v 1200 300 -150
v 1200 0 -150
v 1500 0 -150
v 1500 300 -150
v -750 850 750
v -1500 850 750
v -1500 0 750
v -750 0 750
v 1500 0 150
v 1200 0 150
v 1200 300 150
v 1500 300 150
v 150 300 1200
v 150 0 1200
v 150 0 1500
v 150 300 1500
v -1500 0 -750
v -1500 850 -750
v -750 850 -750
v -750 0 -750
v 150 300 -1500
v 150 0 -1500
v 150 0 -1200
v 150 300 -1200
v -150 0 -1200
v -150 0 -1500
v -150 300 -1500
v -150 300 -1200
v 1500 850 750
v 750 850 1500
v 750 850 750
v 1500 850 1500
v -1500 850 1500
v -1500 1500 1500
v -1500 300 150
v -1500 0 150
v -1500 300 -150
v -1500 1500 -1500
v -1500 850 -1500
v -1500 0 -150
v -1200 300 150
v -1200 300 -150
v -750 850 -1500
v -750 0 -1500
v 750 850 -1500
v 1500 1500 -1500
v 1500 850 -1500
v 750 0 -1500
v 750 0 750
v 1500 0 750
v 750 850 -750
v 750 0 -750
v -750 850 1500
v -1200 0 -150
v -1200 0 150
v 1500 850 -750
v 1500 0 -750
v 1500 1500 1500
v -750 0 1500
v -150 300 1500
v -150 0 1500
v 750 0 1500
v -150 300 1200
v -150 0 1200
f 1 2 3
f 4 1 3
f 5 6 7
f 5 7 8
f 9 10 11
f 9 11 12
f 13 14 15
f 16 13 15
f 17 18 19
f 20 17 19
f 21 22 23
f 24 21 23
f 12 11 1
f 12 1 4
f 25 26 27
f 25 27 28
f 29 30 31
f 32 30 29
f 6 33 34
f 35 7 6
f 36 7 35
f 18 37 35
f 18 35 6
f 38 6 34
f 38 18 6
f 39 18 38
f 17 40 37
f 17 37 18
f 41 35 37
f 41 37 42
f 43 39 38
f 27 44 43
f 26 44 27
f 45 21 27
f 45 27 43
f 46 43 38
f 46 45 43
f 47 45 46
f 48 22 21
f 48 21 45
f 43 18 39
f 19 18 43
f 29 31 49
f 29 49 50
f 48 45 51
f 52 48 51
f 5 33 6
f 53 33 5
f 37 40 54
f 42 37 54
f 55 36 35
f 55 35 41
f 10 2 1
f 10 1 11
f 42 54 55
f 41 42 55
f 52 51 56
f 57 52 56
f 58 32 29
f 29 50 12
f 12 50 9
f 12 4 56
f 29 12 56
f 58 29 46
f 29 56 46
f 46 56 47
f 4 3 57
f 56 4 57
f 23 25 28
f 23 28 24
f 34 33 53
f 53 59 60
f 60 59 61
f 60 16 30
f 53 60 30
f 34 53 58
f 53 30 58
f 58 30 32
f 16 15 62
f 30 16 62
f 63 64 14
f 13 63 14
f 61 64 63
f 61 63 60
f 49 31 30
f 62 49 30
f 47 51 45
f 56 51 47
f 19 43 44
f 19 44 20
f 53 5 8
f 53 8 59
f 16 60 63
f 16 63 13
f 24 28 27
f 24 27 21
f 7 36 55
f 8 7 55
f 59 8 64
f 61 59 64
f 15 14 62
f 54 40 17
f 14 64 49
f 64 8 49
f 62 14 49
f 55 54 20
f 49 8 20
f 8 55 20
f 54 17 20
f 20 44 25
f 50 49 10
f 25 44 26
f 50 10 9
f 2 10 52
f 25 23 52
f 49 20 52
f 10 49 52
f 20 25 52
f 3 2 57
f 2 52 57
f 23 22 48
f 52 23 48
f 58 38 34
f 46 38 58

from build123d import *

# Parameters (mm, degrees)
SKETCH1_W           = 3000
SKETCH1_H           = 3000
BOSS_EXTRUDE1_DEPTH = 1500
SKETCH2_W           = 750
SKETCH2_H           = 750
CUT_EXTRUDE1_DEPTH  = 850
SKETCH4_W           = 300
SKETCH4_H           = 300
CUT_EXTRUDE2_DEPTH  = 300


with BuildPart() as part:
    # Sketch1 → Boss-Extrude1 (new body)
    with BuildSketch(Plane(origin=(0, 0, 0), x_dir=(1, 0, 0), z_dir=(0, 1, 0))):
        Rectangle(SKETCH1_W, SKETCH1_H)
    extrude(amount=BOSS_EXTRUDE1_DEPTH)

    # Sketch2 → Cut-Extrude1 (cut)
    with BuildSketch(Plane.XZ):
        with Locations((-1125, 1125)):
            Rectangle(SKETCH2_W, SKETCH2_H)
        with Locations((1125, 1125)):
            Rectangle(SKETCH2_W, SKETCH2_H)
        with Locations((1125, -1125)):
            Rectangle(SKETCH2_W, SKETCH2_H)
        with Locations((-1125, -1125)):
            Rectangle(SKETCH2_W, SKETCH2_H)
    extrude(amount=-CUT_EXTRUDE1_DEPTH, mode=Mode.SUBTRACT)

    # Sketch4 → Cut-Extrude2 (cut)
    with BuildSketch(Plane.XZ):
        with Locations((0, 1350)):
            Rectangle(SKETCH4_W, SKETCH4_H)
        with Locations((1350, 0)):
            Rectangle(SKETCH4_W, SKETCH4_H)
        with Locations((0, -1350)):
            Rectangle(SKETCH4_W, SKETCH4_H)
        with Locations((-1350, 0)):
            Rectangle(SKETCH4_W, SKETCH4_H)
    extrude(amount=-CUT_EXTRUDE2_DEPTH, mode=Mode.SUBTRACT)


solid = part.part
